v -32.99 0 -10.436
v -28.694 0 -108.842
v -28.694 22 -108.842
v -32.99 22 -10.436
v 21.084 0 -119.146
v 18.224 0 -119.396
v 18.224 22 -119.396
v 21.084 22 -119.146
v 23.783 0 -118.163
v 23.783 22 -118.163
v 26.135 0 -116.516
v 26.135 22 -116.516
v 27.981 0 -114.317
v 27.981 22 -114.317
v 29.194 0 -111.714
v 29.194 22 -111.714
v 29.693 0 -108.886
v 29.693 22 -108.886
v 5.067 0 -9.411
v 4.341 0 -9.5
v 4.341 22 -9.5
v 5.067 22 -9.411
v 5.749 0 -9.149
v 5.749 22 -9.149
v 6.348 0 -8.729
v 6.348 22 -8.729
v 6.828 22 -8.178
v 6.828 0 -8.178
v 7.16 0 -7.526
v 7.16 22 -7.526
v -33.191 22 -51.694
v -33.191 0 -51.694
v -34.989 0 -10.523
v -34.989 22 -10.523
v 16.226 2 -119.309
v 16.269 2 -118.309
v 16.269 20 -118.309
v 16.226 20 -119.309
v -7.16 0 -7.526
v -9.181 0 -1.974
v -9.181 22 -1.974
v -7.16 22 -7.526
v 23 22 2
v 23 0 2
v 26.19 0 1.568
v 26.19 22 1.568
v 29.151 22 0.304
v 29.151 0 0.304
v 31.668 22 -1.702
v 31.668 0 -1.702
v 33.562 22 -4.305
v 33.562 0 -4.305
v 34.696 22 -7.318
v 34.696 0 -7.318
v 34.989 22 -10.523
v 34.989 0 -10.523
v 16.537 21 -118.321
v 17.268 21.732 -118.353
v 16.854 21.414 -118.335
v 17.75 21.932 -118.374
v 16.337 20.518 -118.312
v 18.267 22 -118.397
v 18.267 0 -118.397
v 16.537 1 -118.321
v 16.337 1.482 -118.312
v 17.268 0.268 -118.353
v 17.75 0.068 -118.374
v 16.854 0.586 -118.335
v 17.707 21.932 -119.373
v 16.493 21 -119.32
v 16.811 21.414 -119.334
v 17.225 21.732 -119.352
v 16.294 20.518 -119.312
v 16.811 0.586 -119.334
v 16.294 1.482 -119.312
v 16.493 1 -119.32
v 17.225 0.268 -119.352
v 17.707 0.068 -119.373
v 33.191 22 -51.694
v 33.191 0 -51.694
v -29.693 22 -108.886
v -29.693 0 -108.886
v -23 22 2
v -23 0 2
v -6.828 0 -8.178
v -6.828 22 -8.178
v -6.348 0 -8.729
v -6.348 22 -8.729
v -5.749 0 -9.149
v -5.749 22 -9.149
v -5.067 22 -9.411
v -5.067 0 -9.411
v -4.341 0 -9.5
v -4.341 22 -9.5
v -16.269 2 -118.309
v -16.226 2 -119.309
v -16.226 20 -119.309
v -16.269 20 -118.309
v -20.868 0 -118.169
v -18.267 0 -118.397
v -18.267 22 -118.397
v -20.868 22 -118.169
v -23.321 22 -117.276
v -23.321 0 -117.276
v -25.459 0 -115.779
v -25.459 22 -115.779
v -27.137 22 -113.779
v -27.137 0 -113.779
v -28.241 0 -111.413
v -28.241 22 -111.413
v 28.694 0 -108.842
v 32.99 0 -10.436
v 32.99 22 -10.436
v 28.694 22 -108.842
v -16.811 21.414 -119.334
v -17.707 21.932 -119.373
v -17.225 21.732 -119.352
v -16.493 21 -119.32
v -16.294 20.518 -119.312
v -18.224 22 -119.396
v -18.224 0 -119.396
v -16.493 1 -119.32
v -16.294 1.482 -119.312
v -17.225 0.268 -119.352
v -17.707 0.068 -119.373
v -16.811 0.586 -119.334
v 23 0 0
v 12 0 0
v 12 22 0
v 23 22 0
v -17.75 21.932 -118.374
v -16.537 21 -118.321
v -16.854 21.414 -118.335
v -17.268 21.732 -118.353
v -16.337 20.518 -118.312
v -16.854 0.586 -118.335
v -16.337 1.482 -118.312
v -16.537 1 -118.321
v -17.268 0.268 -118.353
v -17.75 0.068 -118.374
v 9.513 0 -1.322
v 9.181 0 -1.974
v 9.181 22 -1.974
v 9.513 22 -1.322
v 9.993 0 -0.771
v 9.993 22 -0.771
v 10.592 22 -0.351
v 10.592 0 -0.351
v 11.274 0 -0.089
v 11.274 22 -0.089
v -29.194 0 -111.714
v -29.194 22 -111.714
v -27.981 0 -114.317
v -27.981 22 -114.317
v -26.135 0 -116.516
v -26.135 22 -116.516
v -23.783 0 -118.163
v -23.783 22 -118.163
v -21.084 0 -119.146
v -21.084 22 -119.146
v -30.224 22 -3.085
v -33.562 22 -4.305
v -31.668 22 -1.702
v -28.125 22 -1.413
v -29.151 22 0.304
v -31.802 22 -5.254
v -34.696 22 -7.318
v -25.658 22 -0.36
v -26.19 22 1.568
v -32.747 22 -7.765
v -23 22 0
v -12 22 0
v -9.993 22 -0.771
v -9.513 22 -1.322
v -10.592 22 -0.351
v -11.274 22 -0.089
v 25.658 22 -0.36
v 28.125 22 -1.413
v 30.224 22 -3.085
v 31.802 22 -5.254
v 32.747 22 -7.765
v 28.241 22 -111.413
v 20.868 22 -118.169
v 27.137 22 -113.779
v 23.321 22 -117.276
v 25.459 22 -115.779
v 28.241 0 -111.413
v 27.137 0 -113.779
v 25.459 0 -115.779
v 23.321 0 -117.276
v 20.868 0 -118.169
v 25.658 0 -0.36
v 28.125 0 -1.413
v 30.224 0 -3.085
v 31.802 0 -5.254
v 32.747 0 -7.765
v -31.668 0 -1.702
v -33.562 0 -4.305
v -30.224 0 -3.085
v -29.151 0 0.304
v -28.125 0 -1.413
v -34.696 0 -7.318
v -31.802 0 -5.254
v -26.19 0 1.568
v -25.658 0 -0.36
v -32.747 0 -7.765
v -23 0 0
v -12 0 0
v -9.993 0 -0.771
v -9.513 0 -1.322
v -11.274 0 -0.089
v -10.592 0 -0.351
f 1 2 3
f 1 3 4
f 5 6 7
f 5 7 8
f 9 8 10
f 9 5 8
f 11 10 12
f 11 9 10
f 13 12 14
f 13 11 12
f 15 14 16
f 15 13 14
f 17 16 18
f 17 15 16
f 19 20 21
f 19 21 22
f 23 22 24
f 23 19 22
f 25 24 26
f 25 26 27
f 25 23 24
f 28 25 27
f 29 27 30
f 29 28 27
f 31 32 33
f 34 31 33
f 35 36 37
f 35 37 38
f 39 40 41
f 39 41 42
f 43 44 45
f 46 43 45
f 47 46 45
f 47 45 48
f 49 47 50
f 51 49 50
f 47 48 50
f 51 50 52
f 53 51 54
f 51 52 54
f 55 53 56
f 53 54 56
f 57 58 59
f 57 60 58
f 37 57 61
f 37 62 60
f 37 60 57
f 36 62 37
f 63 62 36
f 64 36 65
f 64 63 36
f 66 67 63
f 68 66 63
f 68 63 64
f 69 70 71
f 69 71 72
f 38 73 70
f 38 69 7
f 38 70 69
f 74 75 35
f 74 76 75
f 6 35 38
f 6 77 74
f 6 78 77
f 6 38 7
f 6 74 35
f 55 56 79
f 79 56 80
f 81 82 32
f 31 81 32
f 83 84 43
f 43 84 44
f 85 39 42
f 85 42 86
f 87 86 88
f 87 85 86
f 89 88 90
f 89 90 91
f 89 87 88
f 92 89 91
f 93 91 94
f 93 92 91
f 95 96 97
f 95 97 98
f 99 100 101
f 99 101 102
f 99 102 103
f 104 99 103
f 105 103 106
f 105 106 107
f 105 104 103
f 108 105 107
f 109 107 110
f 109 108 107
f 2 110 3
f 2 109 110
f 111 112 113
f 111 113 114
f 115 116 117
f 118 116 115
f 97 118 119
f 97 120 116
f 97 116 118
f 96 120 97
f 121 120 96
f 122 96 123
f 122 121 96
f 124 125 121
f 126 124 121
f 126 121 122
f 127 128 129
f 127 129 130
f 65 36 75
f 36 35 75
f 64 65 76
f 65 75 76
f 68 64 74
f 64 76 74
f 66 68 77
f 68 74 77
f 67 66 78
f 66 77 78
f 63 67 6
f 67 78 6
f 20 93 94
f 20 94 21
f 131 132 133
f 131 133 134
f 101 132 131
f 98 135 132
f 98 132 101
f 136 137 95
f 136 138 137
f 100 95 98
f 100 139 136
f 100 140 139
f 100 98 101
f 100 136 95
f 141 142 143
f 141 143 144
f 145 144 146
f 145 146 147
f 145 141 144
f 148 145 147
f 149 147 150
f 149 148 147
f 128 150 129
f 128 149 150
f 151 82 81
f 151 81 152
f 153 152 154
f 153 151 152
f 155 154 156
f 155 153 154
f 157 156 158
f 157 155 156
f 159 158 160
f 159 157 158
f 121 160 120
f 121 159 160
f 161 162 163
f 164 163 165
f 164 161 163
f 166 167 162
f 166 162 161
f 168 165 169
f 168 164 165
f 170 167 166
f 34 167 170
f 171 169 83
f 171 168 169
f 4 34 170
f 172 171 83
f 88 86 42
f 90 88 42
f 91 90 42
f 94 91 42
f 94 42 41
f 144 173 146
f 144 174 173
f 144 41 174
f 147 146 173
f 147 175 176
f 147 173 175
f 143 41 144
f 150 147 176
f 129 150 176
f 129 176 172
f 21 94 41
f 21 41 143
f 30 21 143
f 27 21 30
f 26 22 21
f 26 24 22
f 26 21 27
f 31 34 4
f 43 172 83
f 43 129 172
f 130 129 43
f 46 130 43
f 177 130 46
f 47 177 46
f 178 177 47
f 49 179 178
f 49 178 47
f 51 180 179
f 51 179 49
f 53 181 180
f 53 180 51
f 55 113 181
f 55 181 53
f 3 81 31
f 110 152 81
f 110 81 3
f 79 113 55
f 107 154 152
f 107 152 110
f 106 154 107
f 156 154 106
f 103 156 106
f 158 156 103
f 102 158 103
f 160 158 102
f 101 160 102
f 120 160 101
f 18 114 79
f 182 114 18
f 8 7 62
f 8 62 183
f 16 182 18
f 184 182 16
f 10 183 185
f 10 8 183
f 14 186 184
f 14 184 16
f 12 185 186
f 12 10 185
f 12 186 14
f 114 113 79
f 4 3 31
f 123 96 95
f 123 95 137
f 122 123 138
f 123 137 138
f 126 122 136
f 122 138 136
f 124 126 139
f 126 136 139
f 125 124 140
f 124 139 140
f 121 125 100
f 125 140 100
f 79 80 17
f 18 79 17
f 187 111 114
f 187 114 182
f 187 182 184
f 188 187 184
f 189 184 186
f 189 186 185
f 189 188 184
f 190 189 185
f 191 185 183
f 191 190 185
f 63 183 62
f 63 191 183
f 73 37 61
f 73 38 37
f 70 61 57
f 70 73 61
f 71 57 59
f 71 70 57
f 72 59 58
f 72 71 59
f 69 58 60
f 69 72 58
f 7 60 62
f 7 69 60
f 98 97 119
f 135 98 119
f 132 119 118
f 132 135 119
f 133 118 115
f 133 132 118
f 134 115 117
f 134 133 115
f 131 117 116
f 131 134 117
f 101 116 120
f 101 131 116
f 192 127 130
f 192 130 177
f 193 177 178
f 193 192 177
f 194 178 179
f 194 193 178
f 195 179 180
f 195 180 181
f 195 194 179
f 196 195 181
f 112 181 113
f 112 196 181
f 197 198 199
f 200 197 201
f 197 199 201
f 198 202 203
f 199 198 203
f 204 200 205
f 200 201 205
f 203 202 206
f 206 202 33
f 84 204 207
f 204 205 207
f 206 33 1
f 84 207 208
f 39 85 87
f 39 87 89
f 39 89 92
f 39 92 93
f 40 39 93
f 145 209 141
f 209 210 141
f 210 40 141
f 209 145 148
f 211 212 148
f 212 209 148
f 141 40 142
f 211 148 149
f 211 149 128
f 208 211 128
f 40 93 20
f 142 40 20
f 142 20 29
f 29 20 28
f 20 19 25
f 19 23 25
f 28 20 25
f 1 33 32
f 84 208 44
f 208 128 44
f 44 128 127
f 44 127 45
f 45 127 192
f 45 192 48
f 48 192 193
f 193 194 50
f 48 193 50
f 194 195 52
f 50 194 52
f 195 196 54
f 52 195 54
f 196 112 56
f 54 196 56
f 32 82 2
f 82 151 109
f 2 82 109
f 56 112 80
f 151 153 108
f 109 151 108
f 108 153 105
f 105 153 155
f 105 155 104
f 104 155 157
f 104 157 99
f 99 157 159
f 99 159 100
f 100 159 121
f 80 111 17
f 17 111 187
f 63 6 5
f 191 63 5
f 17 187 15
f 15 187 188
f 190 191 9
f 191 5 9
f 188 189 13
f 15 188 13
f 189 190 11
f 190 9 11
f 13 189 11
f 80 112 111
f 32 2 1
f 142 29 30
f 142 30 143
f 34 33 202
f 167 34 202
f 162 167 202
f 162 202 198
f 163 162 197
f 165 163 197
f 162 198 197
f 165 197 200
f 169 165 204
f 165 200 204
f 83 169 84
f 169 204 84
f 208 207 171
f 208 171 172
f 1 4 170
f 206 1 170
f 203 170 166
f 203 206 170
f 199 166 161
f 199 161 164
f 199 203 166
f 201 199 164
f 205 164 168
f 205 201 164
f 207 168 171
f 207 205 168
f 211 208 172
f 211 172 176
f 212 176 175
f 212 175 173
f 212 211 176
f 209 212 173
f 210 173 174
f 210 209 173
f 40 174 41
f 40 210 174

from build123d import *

# Parameters (mm, degrees)
T_LE_DE_BASE_PLI_E1_DEPTH = 22
CONG_1_R                  = 2
BOSS_EXTRU_1_START        = -22
BOSS_EXTRU_1_DEPTH        = 22


# Sheet-metal steps are written as plain solids
with BuildPart() as part:
    # Esquisse1 → Tôle de base pliée1 (new body)
    with BuildSketch(Plane(origin=(0, 0, 0), x_dir=(1, 0, 0), z_dir=(0, 1, 0))):
        with BuildLine():
            Line((-16.269200028, 118.309493267), (-18.267296471, 118.396732042))
            ThreePointArc((-18.267296471, 118.396732042), (-25.459392421, 115.779023194), (-28.69397256, 108.842443699))
            Line((-28.69397256, 108.842443699), (-32.990482216, 10.436193874))
            ThreePointArc((-32.990482216, 10.436193874), (-30.223639621, 3.084869442), (-23, 0))
            Line((-23, 0), (-12, 0))
            ThreePointArc((-12, 0), (-10.279270691, 0.542543867), (-9.180922138, 1.97393957))
            Line((-9.180922138, 1.97393957), (-7.160115408, 7.52606043))
            ThreePointArc((-7.160115408, 7.52606043), (-6.061766854, 8.957456133), (-4.341037545, 9.5))
            Line((-4.341037545, 9.5), (4.341037545, 9.5))
            ThreePointArc((4.341037545, 9.5), (6.061766854, 8.957456133), (7.160115408, 7.52606043))
            Line((7.160115408, 7.52606043), (9.180922138, 1.97393957))
            ThreePointArc((9.180922138, 1.97393957), (10.279270691, 0.542543867), (12, 0))
            Line((12, 0), (23, 0))
            ThreePointArc((23, 0), (30.223639621, 3.084869442), (32.990482216, 10.436193874))
            Line((32.990482216, 10.436193874), (28.69397256, 108.842443699))
            ThreePointArc((28.69397256, 108.842443699), (25.459392421, 115.779023194), (18.267296471, 118.396732042))
            Line((18.267296471, 118.396732042), (16.269200028, 118.309493267))
            Line((16.269200028, 118.309493267), (16.22558064, 119.308541488))
            Line((16.22558064, 119.308541488), (18.223677083, 119.395780263))
            ThreePointArc((18.223677083, 119.395780263), (26.134982628, 116.516300531), (29.693020782, 108.886063087))
            Line((29.693020782, 108.886063087), (33.989530437, 10.479813261))
            ThreePointArc((33.989530437, 10.479813261), (30.946003583, 2.393356386), (23, -1))
            Line((23, -1), (12, -1))
            ThreePointArc((12, -1), (9.705694255, -0.276608177), (8.241229517, 1.631919427))
            Line((8.241229517, 1.631919427), (6.220422787, 7.184040287))
            ThreePointArc((6.220422787, 7.184040287), (5.488190418, 8.138304089), (4.341037545, 8.5))
            Line((4.341037545, 8.5), (-4.341037545, 8.5))
            ThreePointArc((-4.341037545, 8.5), (-5.488190418, 8.138304089), (-6.220422787, 7.184040287))
            Line((-6.220422787, 7.184040287), (-8.241229517, 1.631919427))
            ThreePointArc((-8.241229517, 1.631919427), (-9.705694255, -0.276608177), (-12, -1))
            Line((-12, -1), (-23, -1))
            ThreePointArc((-23, -1), (-30.946003583, 2.393356386), (-33.989530437, 10.479813261))
            Line((-33.989530437, 10.479813261), (-29.693020782, 108.886063087))
            ThreePointArc((-29.693020782, 108.886063087), (-26.134982628, 116.516300531), (-18.223677083, 119.395780263))
            Line((-18.223677083, 119.395780263), (-16.22558064, 119.308541488))
            Line((-16.22558064, 119.308541488), (-16.269200028, 118.309493267))
        make_face()
    extrude(amount=T_LE_DE_BASE_PLI_E1_DEPTH)

    # Congé1
    cong_1_edges = [part.edges().sort_by_distance(p)[0] for p in [
        (16.247390334, 22, -118.809017378),
        (16.247390334, 0, -118.809017378),
        (-16.247390334, 0, -118.809017378),
        (-16.247390334, 22, -118.809017378),
    ]]
    fillet(cong_1_edges, radius=CONG_1_R)

    # Esquisse2 → Boss.-Extru.1 (add)
    with BuildSketch(Plane(origin=(0, 22, 0), x_dir=(1, 0, 0), z_dir=(0, 1, 0)).offset(BOSS_EXTRU_1_START)):
        with BuildLine():
            Line((-29.693020782, 108.886063087), (-33.191022032, 51.694248192))
            Line((-33.191022032, 51.694248192), (-34.988578659, 10.523432648))
            ThreePointArc((-34.988578659, 10.523432648), (-31.668367545, 1.701843331), (-23, -2))
            Line((-23, -2), (23, -2))
            ThreePointArc((23, -2), (31.668367545, 1.701843331), (34.988578659, 10.523432648))
            Line((34.988578659, 10.523432648), (33.191022032, 51.694248192))
            Line((33.191022032, 51.694248192), (29.693020782, 108.886063087))
            Line((29.693020782, 108.886063087), (33.989530437, 10.479813261))
            ThreePointArc((33.989530437, 10.479813261), (30.946003583, 2.393356386), (23, -1))
            Line((23, -1), (12, -1))
            ThreePointArc((12, -1), (9.705694255, -0.276608177), (8.241229517, 1.631919427))
            Line((8.241229517, 1.631919427), (6.220422787, 7.184040287))
            ThreePointArc((6.220422787, 7.184040287), (5.488190418, 8.138304089), (4.341037545, 8.5))
            Line((4.341037545, 8.5), (-4.341037545, 8.5))
            ThreePointArc((-4.341037545, 8.5), (-5.488190418, 8.138304089), (-6.220422787, 7.184040287))
            Line((-6.220422787, 7.184040287), (-8.241229517, 1.631919427))
            ThreePointArc((-8.241229517, 1.631919427), (-9.705694255, -0.276608177), (-12, -1))
            Line((-12, -1), (-23, -1))
            ThreePointArc((-23, -1), (-30.946003583, 2.393356386), (-33.989530437, 10.479813261))
            Line((-33.989530437, 10.479813261), (-29.693020782, 108.886063087))
        make_face()
    extrude(amount=BOSS_EXTRU_1_DEPTH)


solid = part.part
